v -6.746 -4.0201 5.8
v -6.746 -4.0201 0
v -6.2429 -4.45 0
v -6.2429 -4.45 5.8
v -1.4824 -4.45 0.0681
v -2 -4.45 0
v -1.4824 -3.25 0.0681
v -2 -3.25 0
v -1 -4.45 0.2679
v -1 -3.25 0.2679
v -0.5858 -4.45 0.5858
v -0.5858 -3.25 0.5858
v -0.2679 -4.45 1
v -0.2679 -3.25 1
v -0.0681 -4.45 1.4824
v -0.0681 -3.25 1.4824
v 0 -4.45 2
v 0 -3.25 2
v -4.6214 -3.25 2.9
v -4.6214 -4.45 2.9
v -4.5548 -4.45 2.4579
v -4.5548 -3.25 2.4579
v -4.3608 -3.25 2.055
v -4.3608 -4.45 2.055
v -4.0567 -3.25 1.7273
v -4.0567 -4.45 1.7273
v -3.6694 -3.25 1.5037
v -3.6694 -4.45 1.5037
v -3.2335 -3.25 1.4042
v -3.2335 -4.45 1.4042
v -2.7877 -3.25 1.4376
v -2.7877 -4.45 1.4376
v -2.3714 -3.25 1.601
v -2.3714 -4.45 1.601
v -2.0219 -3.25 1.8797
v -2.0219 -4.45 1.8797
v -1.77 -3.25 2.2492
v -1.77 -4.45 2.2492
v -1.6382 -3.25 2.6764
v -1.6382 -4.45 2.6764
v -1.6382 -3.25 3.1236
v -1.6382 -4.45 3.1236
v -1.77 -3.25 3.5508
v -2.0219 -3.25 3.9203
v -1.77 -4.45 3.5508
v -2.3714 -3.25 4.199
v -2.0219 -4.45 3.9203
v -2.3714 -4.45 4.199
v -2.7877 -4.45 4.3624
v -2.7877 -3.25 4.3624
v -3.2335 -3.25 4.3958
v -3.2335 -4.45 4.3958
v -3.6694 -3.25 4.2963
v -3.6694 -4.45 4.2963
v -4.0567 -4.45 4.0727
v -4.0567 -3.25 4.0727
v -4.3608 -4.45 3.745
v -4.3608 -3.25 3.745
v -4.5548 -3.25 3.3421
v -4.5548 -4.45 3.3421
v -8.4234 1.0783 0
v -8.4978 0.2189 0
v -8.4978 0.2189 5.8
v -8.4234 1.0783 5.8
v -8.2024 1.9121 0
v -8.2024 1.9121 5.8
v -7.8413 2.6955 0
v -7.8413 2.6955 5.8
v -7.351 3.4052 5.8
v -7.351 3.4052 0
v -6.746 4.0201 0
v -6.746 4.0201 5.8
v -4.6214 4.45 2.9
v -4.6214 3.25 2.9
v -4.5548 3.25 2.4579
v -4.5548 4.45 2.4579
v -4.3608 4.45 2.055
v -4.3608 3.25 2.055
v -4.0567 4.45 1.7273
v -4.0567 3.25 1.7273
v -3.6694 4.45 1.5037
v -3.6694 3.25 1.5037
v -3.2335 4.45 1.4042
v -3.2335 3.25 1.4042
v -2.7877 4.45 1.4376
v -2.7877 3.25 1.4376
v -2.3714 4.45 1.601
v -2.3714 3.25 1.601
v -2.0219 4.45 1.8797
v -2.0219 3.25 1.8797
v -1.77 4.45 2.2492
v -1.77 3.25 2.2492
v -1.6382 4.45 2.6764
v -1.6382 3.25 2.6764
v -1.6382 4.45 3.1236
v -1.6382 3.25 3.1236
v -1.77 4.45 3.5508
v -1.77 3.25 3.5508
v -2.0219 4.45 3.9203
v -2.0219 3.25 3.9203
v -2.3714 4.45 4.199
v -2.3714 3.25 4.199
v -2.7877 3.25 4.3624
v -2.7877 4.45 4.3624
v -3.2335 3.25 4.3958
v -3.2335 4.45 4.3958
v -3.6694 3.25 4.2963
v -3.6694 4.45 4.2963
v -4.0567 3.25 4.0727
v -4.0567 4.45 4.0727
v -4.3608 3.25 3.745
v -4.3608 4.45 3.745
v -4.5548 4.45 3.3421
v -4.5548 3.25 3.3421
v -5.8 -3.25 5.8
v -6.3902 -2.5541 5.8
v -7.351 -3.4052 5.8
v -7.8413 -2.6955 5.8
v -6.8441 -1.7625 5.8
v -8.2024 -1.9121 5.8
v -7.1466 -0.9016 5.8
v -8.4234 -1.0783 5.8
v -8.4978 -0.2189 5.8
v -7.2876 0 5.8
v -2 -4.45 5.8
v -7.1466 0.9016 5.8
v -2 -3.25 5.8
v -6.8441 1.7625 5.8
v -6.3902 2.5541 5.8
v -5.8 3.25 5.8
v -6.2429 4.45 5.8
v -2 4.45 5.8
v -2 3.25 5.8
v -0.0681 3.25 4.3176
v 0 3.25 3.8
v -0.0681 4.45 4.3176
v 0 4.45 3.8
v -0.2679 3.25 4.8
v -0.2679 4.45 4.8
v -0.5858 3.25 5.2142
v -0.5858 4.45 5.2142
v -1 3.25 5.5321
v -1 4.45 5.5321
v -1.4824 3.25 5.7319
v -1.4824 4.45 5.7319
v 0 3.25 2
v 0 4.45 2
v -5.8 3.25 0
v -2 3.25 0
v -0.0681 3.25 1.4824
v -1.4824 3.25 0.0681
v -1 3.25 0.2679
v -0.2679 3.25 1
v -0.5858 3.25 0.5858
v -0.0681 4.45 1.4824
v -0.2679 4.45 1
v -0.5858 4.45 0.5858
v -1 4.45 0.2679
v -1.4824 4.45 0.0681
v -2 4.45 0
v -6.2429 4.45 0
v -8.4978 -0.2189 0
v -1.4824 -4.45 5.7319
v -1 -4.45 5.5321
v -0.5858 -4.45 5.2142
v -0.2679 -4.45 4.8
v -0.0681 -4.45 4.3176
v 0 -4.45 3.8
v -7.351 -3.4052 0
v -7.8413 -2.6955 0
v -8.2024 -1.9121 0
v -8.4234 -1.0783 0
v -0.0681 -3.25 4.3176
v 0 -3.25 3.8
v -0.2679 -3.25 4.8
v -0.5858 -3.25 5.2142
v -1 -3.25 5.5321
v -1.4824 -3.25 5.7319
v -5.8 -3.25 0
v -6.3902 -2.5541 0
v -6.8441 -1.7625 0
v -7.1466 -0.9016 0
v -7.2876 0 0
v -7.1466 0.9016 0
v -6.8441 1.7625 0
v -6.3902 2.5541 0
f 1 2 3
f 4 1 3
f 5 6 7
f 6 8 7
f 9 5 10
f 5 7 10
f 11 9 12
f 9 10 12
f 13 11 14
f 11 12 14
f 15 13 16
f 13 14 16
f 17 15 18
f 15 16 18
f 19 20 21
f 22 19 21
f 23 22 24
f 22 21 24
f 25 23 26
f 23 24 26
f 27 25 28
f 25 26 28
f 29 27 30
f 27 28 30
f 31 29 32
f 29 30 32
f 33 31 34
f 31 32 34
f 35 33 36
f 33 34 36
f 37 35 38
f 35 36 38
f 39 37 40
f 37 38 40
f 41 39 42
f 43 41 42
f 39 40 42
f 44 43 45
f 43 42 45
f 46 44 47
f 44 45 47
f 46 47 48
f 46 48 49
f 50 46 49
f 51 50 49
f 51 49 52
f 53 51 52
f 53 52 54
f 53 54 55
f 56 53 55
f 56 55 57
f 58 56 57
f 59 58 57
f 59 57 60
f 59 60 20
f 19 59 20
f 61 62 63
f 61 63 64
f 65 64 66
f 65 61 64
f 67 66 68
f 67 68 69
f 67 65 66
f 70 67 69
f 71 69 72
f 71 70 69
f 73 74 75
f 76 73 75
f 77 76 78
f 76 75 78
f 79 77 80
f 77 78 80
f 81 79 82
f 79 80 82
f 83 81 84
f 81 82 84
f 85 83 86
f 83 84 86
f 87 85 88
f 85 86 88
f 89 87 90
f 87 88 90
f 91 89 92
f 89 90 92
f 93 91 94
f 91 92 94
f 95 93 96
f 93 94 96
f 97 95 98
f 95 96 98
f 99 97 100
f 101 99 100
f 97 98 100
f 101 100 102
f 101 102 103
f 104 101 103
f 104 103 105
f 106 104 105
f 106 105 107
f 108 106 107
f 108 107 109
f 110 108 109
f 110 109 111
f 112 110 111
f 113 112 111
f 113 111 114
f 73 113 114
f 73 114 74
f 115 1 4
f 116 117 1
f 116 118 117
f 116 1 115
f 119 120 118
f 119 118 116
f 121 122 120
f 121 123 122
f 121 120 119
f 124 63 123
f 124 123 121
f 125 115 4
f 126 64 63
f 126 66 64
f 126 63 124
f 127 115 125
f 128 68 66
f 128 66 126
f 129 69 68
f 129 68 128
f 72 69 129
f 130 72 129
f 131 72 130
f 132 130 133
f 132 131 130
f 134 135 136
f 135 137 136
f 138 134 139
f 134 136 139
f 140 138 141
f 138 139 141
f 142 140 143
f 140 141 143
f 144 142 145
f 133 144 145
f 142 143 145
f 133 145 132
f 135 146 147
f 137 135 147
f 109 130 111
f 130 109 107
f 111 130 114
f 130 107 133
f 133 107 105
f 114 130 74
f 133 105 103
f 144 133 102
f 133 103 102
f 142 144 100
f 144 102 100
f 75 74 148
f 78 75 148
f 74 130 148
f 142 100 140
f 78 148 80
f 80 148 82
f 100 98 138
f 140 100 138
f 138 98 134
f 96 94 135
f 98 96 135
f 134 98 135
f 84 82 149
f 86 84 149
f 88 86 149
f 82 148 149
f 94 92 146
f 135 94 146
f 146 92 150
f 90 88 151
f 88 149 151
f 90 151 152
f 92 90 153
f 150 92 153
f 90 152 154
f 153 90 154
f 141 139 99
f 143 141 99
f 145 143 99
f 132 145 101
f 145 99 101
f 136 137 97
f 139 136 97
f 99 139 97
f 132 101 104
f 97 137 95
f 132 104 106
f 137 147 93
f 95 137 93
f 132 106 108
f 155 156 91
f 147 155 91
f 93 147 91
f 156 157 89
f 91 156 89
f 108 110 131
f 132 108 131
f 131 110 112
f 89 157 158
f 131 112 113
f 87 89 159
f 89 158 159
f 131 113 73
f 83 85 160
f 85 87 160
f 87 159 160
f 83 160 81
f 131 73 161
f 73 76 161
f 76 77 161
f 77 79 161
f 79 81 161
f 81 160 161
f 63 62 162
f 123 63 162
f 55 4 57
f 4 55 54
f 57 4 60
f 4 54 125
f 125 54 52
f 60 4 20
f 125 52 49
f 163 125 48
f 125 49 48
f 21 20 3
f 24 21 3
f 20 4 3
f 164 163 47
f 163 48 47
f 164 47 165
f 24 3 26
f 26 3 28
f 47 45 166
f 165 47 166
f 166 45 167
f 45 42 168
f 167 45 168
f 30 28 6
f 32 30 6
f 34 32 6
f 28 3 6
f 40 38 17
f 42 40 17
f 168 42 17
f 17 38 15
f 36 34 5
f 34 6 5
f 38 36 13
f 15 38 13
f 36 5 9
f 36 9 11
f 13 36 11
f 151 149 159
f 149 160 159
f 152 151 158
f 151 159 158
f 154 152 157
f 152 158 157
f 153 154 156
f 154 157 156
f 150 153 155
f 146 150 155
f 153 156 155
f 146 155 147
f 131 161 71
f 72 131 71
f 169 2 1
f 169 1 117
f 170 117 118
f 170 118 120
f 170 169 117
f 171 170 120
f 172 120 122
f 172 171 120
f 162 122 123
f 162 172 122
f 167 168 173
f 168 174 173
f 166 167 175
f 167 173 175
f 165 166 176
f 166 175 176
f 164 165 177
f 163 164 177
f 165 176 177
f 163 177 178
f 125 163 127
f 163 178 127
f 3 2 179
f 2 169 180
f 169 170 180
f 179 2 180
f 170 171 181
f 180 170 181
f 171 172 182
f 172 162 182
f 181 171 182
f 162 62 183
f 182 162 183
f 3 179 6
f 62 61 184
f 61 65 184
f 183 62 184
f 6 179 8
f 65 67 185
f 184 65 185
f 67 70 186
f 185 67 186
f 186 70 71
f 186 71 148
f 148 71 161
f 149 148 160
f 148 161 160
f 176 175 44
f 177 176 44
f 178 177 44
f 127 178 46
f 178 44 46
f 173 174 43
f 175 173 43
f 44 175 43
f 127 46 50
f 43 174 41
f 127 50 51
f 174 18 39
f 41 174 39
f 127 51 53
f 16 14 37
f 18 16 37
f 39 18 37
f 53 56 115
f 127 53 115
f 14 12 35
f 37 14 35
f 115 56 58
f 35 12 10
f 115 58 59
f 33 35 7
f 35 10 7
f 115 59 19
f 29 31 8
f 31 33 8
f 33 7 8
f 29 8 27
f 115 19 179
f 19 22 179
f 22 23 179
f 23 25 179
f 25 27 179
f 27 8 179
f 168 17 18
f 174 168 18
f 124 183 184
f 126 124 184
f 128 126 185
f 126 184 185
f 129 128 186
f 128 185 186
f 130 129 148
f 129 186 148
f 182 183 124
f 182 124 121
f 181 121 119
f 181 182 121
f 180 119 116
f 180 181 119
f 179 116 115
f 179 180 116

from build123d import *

# Parameters (mm, degrees)
F2_DEPTH    = 5.8
F3_T1_DEPTH = 17.3214031257
F3_T3_DEPTH = 5.8
F5_DEPTH    = 8.901
F6_R        = 2


# Not quite as in the source:
# - a fillet or chamfer that OpenCascade refuses, or shapes differently, is made with other operations: its cross-section is extruded or revolved along the edge and cut away or added


with BuildPart() as f2:
    # F1 (on Top) → F2 (new body)
    with BuildSketch(Plane.XY):
        Polygon((-7.2977824063, -1.970131098), (-7.2977824063, 0), (-7.2977824063, 1.970131098), (-5.8, 3.25), (0, 3.25), (0, 4.45), (-6.2428722575, 4.45), (-8.4977824063, 2.523158448), (-8.4977824063, 0), (-8.4977824063, -2.523158448), (-6.2428722575, -4.45), (0, -4.45), (0, -3.25), (-5.8, -3.25), align=None)
    extrude(amount=F2_DEPTH)

    # F3: fillet of radius 5 on 4 edges, made by hand

    # F3_s2 → F3_t1 (cut)
    with BuildSketch(Plane.XY.offset(-5.7607015629)):
        with BuildLine():
            ThreePointArc((-6.7459644775, -4.0201030507), (-8.0387575415, -2.3116140275), (-8.4977824063, -0.2188778229))
            Line((-8.4977824063, -0.2188778229), (-8.5977824063, -0.2188778229))
            Line((-8.5977824063, -0.2188778229), (-8.5977824063, -2.5692440605))
            Line((-8.5977824063, -2.5692440605), (-6.8109281189, -4.0961275552))
            Line((-6.8109281189, -4.0961275552), (-6.7459644775, -4.0201030507))
        make_face()
        with BuildLine():
            ThreePointArc((-8.4977824063, 0.2188778229), (-8.0387575415, 2.3116140275), (-6.7459644775, 4.0201030507))
            Line((-6.7459644775, 4.0201030507), (-6.8109281189, 4.0961275552))
            Line((-6.8109281189, 4.0961275552), (-8.5977824063, 2.5692440605))
            Line((-8.5977824063, 2.5692440605), (-8.5977824063, 0.2188778229))
            Line((-8.5977824063, 0.2188778229), (-8.4977824063, 0.2188778229))
        make_face()
    extrude(amount=F3_T1_DEPTH, mode=Mode.SUBTRACT)

    # F3_s4 → F3_t3 (join)
    with BuildSketch(Plane.XY):
        with BuildLine():
            ThreePointArc((-7.2977824063, 0.3185391867), (-6.9081559253, -1.6165205064), (-5.8, -3.25))
            Line((-5.8, -3.25), (-5.8700443519, -3.3213707837))
            ThreePointArc((-5.8700443519, -3.3213707837), (-6.6138548446, -2.6860900535), (-7.3627460478, -2.0461556025))
            Line((-7.3627460478, -2.0461556025), (-7.3977824063, -1.970131098))
            Line((-7.3977824063, -1.970131098), (-7.3977824063, 0.3185391867))
            Line((-7.3977824063, 0.3185391867), (-7.2977824063, 0.3185391867))
        make_face()
        with BuildLine():
            ThreePointArc((-7.2977824063, -0.3185391867), (-6.9081559253, 1.6165205064), (-5.8, 3.25))
            Line((-5.8, 3.25), (-5.8700443519, 3.3213707837))
            ThreePointArc((-5.8700443519, 3.3213707837), (-6.6138548446, 2.6860900535), (-7.3627460478, 2.0461556025))
            Line((-7.3627460478, 2.0461556025), (-7.3977824063, 1.970131098))
            Line((-7.3977824063, 1.970131098), (-7.3977824063, -0.3185391867))
            Line((-7.3977824063, -0.3185391867), (-7.2977824063, -0.3185391867))
        make_face()
    extrude(amount=F3_T3_DEPTH)

    # F4 (on face) → F5 (cut, through all)
    with BuildSketch(Plane.XZ.offset(4.45)):
        with BuildLine():
            Line((-4.6214361287, 2.9), (-3.1214361287, 2.9))
            Line((-3.1214361287, 2.9), (-1.6214361287, 2.9))
            ThreePointArc((-1.6214361287, 2.9), (-3.1214361287, 4.4), (-4.6214361287, 2.9))
        make_face()
        with BuildLine():
            Line((-1.6214361287, 2.9), (-3.1214361287, 2.9))
            Line((-3.1214361287, 2.9), (-4.6214361287, 2.9))
            ThreePointArc((-4.6214361287, 2.9), (-3.1214361287, 1.4), (-1.6214361287, 2.9))
        make_face()
    extrude(amount=-F5_DEPTH, mode=Mode.SUBTRACT)

    # F6
    f6_edges = [f2.edges().sort_by_distance(p)[0] for p in [
        (0, 3.85, 5.8),
        (0, -3.85, 5.8),
        (0, 3.85, 0),
        (0, -3.85, 0),
    ]]
    fillet(f6_edges, radius=F6_R)


solid = f2.part
